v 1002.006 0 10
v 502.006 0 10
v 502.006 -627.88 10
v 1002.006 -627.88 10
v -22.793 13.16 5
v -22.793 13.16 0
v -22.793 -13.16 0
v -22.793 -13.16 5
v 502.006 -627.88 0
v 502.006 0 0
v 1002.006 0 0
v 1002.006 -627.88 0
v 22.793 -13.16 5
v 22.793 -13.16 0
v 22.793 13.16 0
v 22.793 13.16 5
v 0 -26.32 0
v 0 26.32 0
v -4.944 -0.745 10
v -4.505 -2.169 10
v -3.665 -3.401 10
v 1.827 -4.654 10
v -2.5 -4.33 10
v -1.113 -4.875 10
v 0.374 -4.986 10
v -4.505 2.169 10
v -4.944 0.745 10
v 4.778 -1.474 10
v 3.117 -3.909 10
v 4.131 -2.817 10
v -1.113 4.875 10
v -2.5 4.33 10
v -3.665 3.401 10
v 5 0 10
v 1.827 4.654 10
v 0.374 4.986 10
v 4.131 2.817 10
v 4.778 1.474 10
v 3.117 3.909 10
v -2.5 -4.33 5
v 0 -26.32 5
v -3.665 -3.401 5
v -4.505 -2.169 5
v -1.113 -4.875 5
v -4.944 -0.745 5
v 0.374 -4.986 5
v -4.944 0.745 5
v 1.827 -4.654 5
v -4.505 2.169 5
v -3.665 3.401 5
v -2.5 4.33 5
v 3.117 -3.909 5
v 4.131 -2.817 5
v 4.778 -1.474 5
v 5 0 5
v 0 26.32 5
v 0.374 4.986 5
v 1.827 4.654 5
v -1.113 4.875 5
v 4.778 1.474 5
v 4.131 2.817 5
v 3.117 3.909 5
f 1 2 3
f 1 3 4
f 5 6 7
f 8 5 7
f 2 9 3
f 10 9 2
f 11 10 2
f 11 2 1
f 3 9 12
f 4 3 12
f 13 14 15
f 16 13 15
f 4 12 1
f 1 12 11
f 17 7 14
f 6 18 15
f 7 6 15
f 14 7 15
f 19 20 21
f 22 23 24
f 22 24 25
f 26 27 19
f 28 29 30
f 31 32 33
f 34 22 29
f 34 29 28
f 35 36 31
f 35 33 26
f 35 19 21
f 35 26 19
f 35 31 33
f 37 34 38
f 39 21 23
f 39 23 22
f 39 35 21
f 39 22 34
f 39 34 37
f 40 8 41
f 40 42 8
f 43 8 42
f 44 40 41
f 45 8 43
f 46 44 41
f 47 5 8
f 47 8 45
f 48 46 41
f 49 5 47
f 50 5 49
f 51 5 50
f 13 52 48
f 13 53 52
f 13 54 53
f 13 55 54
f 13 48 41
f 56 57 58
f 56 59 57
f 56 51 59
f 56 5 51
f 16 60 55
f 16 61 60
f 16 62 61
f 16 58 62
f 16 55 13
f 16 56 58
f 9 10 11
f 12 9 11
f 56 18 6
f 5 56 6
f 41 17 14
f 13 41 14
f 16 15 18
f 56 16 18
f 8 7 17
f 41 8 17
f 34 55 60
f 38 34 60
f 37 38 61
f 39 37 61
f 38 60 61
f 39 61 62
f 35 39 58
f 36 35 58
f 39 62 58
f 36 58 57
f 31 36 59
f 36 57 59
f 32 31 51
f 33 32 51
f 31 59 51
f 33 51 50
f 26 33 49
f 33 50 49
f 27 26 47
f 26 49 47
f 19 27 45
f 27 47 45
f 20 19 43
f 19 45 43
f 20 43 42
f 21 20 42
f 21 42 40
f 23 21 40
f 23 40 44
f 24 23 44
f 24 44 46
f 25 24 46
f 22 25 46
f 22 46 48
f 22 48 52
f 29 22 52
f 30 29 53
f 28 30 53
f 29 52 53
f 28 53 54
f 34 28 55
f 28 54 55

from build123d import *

# Parameters (mm, degrees)
F1_DEPTH = 5
F2_R     = 5
F3_DEPTH = 5
F4_W     = 500
F4_H     = 627.879878
F5_DEPTH = 10


with BuildPart() as f1:
    # F0 (on Top) → F1 (new body)
    with BuildSketch(Plane.XY):
        Polygon((22.793479, -13.159821), (22.793479, 13.159821), (0, 26.319643), (-22.793479, 13.159821), (-22.793479, -13.159821), (0, -26.319643), align=None)
    extrude(amount=F1_DEPTH)

    # F2 (on face) → F3 (join)
    with BuildSketch(Plane.XY.offset(5)):
        Circle(F2_R)
    extrude(amount=F3_DEPTH)


with BuildPart() as f5:
    # F4 (on Top) → F5 (new body)
    with BuildSketch(Plane.XY):
        with Locations((752.005506, -313.939939)):
            Rectangle(F4_W, F4_H)
    extrude(amount=F5_DEPTH)


solid = Compound([f1.part, f5.part])
